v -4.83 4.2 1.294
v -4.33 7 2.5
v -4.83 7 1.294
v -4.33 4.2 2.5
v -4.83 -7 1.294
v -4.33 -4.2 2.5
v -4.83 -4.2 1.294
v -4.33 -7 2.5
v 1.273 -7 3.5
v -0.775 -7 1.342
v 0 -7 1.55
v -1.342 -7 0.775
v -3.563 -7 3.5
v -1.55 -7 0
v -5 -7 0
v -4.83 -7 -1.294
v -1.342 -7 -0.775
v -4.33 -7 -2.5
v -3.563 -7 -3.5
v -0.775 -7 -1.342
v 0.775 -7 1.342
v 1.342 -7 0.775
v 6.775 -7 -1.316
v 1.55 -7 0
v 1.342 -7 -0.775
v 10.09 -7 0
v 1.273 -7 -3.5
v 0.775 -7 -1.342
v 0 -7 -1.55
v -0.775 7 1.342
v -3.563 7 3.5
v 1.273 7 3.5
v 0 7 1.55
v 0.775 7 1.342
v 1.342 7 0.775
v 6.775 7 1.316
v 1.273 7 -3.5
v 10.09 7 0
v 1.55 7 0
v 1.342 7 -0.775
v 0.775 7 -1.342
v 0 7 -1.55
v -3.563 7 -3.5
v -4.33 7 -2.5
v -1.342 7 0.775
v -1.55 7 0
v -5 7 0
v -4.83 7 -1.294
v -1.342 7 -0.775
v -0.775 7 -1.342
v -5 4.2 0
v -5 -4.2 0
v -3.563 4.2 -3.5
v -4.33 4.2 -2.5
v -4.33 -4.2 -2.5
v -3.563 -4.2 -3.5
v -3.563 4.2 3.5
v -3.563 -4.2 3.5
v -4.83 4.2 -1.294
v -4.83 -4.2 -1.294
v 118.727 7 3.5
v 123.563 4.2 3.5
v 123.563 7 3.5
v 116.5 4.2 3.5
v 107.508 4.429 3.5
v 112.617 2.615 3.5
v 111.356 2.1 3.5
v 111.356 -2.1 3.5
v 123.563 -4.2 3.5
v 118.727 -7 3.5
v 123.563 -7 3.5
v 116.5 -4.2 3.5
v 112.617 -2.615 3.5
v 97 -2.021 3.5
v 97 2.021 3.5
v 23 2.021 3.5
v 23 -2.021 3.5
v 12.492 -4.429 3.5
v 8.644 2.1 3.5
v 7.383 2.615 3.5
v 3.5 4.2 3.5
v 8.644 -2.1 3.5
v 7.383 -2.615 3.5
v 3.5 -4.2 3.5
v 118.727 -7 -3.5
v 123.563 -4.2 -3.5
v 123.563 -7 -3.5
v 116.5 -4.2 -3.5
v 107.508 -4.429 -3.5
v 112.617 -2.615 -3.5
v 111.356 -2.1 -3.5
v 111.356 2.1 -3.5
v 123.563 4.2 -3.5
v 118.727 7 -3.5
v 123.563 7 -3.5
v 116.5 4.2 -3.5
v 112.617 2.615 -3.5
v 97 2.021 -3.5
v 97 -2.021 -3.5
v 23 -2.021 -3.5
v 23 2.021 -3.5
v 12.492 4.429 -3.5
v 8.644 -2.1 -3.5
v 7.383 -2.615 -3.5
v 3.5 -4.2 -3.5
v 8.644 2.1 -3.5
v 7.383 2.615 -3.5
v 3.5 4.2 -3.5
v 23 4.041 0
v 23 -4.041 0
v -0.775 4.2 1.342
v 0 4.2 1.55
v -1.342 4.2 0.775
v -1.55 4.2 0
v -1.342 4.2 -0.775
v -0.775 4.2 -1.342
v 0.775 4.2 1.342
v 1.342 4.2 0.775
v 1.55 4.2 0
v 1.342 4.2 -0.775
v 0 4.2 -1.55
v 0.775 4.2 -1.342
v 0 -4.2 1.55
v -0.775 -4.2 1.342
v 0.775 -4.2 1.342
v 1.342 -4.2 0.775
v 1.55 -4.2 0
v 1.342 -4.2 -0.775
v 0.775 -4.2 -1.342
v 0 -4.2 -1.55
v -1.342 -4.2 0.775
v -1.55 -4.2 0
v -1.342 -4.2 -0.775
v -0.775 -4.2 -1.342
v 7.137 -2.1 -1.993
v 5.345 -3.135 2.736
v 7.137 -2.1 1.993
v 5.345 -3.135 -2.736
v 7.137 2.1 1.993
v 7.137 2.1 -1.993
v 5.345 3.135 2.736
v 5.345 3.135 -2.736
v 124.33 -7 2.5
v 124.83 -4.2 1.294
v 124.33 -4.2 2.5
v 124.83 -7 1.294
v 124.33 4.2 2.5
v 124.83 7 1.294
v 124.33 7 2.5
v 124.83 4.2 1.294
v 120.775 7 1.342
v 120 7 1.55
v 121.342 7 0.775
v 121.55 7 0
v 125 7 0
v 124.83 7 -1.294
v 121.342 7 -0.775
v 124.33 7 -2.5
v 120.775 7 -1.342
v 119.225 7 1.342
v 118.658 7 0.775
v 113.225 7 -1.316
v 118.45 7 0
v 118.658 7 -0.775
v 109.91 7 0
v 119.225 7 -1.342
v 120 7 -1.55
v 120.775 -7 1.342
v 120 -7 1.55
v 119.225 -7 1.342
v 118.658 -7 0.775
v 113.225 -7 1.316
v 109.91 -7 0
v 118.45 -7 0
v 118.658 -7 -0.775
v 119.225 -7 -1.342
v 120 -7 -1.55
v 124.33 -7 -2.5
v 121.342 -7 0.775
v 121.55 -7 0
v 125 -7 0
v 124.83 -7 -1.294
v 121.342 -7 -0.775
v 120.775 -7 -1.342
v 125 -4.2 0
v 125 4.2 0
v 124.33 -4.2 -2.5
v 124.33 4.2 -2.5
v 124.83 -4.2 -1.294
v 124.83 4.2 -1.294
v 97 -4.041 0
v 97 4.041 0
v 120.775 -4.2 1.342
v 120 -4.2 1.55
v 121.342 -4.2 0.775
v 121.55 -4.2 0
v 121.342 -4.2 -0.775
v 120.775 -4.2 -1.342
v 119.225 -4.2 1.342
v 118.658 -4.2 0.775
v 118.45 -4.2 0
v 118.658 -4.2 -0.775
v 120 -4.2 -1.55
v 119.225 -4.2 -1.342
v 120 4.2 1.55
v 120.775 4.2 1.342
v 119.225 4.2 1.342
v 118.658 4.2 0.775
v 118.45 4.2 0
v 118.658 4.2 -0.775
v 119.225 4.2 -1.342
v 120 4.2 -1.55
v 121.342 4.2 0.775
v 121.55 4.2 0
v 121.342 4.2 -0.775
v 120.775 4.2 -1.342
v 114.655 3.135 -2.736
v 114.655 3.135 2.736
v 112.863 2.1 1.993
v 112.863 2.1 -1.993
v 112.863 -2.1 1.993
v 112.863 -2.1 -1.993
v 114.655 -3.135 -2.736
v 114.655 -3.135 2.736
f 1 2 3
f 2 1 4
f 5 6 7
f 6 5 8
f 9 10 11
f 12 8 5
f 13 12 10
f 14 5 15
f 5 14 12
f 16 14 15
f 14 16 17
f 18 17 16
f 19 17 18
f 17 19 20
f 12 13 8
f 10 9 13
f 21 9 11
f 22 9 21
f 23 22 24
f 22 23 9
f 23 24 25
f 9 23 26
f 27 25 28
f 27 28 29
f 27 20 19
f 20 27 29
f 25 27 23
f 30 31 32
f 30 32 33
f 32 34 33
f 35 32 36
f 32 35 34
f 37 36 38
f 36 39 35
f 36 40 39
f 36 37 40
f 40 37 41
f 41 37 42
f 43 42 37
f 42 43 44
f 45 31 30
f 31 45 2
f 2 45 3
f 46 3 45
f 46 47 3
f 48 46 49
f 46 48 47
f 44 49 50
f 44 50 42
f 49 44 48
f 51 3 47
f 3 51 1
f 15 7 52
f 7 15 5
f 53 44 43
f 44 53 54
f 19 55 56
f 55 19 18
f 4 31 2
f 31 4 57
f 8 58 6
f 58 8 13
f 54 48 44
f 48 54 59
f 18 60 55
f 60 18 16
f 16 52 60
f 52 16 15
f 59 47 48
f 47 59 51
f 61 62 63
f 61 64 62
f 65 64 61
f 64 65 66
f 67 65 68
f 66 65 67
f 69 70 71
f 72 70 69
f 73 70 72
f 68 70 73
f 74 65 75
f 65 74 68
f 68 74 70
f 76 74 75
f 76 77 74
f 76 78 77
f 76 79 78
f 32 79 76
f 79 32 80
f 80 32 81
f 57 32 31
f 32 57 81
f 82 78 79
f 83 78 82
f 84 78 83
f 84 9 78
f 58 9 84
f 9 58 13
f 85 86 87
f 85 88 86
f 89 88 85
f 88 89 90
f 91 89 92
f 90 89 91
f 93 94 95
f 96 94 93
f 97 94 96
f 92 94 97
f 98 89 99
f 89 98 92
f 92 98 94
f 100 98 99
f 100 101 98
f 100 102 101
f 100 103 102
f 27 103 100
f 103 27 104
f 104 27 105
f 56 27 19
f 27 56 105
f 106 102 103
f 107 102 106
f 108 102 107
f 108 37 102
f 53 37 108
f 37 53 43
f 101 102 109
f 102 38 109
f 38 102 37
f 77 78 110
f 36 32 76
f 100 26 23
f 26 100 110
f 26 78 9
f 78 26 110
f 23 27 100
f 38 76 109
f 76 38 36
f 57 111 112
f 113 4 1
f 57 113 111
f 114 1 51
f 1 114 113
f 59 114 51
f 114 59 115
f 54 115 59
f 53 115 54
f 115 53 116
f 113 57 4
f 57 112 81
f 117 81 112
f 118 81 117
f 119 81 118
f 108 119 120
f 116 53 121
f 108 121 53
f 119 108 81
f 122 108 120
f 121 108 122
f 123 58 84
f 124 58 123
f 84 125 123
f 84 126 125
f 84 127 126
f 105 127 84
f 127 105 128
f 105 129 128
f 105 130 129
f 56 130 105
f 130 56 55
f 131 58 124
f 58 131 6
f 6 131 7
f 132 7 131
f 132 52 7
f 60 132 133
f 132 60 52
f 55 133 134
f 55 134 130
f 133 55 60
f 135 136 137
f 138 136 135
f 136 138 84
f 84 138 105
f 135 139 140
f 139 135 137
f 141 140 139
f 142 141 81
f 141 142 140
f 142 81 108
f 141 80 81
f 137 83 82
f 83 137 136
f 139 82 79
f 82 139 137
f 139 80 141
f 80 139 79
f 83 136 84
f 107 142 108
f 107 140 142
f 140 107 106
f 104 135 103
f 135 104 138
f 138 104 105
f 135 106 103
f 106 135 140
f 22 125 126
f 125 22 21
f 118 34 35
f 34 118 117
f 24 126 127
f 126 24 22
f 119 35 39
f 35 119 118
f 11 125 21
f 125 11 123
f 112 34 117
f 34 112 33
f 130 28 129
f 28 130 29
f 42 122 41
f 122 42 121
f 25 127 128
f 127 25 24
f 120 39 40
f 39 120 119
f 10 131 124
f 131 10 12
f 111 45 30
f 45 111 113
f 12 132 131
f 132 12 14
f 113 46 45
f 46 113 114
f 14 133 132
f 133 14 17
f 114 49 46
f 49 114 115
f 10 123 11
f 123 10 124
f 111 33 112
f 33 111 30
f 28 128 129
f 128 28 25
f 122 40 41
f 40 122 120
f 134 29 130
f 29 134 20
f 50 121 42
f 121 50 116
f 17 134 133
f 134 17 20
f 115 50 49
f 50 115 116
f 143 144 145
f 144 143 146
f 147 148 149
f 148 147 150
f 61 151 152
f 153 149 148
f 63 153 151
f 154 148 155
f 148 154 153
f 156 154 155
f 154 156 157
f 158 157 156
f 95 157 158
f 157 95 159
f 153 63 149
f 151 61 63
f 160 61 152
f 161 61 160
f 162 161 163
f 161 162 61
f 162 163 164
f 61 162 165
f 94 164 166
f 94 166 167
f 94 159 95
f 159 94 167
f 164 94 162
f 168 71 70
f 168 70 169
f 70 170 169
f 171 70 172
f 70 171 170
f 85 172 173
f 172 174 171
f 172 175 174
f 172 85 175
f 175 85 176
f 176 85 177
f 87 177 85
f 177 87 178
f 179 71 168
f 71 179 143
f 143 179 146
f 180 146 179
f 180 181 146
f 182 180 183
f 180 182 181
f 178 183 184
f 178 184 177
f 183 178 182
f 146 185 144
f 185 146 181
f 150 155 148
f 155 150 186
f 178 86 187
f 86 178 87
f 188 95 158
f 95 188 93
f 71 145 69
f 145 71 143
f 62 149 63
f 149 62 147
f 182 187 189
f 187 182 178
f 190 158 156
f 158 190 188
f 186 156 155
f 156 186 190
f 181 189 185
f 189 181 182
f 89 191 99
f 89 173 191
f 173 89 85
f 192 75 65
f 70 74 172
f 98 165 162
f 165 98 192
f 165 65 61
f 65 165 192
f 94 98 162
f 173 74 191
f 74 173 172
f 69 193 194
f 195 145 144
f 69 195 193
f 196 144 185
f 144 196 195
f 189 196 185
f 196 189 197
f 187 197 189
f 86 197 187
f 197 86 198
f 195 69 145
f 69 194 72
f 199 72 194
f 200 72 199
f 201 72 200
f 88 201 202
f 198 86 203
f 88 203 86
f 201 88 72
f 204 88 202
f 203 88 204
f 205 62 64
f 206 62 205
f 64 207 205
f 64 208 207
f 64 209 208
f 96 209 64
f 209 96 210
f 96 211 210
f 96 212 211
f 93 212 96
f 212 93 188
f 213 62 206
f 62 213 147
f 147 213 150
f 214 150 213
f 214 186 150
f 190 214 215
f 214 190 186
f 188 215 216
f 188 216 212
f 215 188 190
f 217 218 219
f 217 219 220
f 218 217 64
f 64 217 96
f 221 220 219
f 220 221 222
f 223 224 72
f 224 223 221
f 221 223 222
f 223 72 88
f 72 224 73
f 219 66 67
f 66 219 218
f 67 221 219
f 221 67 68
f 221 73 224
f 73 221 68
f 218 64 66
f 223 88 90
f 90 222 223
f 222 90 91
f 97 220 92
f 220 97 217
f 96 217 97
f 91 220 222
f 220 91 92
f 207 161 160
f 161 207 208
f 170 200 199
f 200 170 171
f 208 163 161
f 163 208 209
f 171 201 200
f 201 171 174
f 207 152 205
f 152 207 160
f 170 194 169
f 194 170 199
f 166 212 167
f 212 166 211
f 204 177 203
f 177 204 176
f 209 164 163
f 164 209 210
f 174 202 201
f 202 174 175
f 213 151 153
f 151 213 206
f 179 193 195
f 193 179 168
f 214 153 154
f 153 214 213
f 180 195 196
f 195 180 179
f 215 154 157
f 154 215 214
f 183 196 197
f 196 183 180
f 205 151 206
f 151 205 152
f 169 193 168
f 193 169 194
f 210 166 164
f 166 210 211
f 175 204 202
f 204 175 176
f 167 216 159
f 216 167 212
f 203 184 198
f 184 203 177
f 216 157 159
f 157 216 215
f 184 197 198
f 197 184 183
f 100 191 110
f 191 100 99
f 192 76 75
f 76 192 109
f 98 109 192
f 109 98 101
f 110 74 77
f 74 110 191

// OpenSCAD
// file: jaws.scad
h = 7;
r = h/2 / cos(30);
rode_diam = 5.6;

module jaws() {
  difference() {
    union() {
      intersection () {
        rotate([90, 0, 0]) cylinder(r=5, h=14, center=true, $fn=24);
        translate([-4, 0, 0]) cube([10, 14, h], center=true);
      }
      intersection() {
        translate([10, 0, 0]) cube([26, 14, h], center=true);
        translate([10, 0, 0]) rotate([0, 90, 0]) rotate([0, 0, 30])
          cylinder(r1=10, r2=r, h=26, center=true, $fn=6);
      }
    }
    translate([-1.5, 0, 0]) cube([10, 8.4, 10], center=true);
    translate([3.5, 0, 0]) rotate([0, 0, 30])
      cylinder(r=4.2, h=10, center=true, $fn=6);
    translate([4, 0, 4]) rotate([0, 45, 0])
      rotate([0, 0, 30]) cylinder(r=4.2, h=8, center=true, $fn=6);
    translate([4, 0, -4]) rotate([0, -45, 0])
      rotate([0, 0, 30]) cylinder(r=4.2, h=8, center=true, $fn=6);
    rotate([90, 0, 0]) cylinder(r=1.55, h=40, center=true, $fn=12);
    // Rod hole
    translate([19, 0, 0]) rotate([0, 90, 0])
      cylinder(r=rode_diam/2, h=20, center=true, $fn=12);
  }
}

translate([0, 0, h/2]) jaws();
// main file
use <jaws.scad>

l = 120;
h = 7;
r = h/2 / cos(30);

// Wipe nozzle after long travel moves.
module collar() {
  difference() {
    cube([4, 20, h], center=true);
    cube([2, 18, h+1], center=true);
    rotate([0, 90, 0]) rotate([0, 0, 30])
      cylinder(r=5, h=5, center=true, $fn=6);
  }
}

// Small hollow cube.
module cubicle() {
  difference() {
    cube([6, 6, h], center=true);
    cube([4, 4, h+1], center=true);
  }
}

// Nozzle wipers.
module wipers() {
  translate([l/2+2, 0, 0]) cubicle();
  translate([-l/2-2, 0, 0]) cubicle();
  translate([l/2-25, 0, 0]) collar();
  translate([-l/2+25, 0, 0]) collar();
}

// Rod with two Y shaped rod ends.
module rod(l) {
  translate([l/2,0,0])
  union() {
    translate([-l/2, 0, 0]) jaws();
    translate([l/2, 0, 0]) rotate([0, 0, 180]) jaws();
    rotate([0, 90, 0]) rotate([0, 0, 30])
      cylinder(r=r, h=l-18, center=true, $fn=6);
  }
}

module printable_rod(l)
{
	// Print platform.
	bed = 8*25.4; // 8x8 inches.
	% translate([0, 0, -1]) cube([bed, bed, 2], center=true);

	rotate(45)
	translate([-l/2,0,h/2])
	rod(l=l);

	// If your nozzle doesn't ooze at all, you can comment the next line out.
	translate([0,0,h/2])
	rotate(45)
	wipers();
}

rod(l=l);
//printable_rod(l=l);
